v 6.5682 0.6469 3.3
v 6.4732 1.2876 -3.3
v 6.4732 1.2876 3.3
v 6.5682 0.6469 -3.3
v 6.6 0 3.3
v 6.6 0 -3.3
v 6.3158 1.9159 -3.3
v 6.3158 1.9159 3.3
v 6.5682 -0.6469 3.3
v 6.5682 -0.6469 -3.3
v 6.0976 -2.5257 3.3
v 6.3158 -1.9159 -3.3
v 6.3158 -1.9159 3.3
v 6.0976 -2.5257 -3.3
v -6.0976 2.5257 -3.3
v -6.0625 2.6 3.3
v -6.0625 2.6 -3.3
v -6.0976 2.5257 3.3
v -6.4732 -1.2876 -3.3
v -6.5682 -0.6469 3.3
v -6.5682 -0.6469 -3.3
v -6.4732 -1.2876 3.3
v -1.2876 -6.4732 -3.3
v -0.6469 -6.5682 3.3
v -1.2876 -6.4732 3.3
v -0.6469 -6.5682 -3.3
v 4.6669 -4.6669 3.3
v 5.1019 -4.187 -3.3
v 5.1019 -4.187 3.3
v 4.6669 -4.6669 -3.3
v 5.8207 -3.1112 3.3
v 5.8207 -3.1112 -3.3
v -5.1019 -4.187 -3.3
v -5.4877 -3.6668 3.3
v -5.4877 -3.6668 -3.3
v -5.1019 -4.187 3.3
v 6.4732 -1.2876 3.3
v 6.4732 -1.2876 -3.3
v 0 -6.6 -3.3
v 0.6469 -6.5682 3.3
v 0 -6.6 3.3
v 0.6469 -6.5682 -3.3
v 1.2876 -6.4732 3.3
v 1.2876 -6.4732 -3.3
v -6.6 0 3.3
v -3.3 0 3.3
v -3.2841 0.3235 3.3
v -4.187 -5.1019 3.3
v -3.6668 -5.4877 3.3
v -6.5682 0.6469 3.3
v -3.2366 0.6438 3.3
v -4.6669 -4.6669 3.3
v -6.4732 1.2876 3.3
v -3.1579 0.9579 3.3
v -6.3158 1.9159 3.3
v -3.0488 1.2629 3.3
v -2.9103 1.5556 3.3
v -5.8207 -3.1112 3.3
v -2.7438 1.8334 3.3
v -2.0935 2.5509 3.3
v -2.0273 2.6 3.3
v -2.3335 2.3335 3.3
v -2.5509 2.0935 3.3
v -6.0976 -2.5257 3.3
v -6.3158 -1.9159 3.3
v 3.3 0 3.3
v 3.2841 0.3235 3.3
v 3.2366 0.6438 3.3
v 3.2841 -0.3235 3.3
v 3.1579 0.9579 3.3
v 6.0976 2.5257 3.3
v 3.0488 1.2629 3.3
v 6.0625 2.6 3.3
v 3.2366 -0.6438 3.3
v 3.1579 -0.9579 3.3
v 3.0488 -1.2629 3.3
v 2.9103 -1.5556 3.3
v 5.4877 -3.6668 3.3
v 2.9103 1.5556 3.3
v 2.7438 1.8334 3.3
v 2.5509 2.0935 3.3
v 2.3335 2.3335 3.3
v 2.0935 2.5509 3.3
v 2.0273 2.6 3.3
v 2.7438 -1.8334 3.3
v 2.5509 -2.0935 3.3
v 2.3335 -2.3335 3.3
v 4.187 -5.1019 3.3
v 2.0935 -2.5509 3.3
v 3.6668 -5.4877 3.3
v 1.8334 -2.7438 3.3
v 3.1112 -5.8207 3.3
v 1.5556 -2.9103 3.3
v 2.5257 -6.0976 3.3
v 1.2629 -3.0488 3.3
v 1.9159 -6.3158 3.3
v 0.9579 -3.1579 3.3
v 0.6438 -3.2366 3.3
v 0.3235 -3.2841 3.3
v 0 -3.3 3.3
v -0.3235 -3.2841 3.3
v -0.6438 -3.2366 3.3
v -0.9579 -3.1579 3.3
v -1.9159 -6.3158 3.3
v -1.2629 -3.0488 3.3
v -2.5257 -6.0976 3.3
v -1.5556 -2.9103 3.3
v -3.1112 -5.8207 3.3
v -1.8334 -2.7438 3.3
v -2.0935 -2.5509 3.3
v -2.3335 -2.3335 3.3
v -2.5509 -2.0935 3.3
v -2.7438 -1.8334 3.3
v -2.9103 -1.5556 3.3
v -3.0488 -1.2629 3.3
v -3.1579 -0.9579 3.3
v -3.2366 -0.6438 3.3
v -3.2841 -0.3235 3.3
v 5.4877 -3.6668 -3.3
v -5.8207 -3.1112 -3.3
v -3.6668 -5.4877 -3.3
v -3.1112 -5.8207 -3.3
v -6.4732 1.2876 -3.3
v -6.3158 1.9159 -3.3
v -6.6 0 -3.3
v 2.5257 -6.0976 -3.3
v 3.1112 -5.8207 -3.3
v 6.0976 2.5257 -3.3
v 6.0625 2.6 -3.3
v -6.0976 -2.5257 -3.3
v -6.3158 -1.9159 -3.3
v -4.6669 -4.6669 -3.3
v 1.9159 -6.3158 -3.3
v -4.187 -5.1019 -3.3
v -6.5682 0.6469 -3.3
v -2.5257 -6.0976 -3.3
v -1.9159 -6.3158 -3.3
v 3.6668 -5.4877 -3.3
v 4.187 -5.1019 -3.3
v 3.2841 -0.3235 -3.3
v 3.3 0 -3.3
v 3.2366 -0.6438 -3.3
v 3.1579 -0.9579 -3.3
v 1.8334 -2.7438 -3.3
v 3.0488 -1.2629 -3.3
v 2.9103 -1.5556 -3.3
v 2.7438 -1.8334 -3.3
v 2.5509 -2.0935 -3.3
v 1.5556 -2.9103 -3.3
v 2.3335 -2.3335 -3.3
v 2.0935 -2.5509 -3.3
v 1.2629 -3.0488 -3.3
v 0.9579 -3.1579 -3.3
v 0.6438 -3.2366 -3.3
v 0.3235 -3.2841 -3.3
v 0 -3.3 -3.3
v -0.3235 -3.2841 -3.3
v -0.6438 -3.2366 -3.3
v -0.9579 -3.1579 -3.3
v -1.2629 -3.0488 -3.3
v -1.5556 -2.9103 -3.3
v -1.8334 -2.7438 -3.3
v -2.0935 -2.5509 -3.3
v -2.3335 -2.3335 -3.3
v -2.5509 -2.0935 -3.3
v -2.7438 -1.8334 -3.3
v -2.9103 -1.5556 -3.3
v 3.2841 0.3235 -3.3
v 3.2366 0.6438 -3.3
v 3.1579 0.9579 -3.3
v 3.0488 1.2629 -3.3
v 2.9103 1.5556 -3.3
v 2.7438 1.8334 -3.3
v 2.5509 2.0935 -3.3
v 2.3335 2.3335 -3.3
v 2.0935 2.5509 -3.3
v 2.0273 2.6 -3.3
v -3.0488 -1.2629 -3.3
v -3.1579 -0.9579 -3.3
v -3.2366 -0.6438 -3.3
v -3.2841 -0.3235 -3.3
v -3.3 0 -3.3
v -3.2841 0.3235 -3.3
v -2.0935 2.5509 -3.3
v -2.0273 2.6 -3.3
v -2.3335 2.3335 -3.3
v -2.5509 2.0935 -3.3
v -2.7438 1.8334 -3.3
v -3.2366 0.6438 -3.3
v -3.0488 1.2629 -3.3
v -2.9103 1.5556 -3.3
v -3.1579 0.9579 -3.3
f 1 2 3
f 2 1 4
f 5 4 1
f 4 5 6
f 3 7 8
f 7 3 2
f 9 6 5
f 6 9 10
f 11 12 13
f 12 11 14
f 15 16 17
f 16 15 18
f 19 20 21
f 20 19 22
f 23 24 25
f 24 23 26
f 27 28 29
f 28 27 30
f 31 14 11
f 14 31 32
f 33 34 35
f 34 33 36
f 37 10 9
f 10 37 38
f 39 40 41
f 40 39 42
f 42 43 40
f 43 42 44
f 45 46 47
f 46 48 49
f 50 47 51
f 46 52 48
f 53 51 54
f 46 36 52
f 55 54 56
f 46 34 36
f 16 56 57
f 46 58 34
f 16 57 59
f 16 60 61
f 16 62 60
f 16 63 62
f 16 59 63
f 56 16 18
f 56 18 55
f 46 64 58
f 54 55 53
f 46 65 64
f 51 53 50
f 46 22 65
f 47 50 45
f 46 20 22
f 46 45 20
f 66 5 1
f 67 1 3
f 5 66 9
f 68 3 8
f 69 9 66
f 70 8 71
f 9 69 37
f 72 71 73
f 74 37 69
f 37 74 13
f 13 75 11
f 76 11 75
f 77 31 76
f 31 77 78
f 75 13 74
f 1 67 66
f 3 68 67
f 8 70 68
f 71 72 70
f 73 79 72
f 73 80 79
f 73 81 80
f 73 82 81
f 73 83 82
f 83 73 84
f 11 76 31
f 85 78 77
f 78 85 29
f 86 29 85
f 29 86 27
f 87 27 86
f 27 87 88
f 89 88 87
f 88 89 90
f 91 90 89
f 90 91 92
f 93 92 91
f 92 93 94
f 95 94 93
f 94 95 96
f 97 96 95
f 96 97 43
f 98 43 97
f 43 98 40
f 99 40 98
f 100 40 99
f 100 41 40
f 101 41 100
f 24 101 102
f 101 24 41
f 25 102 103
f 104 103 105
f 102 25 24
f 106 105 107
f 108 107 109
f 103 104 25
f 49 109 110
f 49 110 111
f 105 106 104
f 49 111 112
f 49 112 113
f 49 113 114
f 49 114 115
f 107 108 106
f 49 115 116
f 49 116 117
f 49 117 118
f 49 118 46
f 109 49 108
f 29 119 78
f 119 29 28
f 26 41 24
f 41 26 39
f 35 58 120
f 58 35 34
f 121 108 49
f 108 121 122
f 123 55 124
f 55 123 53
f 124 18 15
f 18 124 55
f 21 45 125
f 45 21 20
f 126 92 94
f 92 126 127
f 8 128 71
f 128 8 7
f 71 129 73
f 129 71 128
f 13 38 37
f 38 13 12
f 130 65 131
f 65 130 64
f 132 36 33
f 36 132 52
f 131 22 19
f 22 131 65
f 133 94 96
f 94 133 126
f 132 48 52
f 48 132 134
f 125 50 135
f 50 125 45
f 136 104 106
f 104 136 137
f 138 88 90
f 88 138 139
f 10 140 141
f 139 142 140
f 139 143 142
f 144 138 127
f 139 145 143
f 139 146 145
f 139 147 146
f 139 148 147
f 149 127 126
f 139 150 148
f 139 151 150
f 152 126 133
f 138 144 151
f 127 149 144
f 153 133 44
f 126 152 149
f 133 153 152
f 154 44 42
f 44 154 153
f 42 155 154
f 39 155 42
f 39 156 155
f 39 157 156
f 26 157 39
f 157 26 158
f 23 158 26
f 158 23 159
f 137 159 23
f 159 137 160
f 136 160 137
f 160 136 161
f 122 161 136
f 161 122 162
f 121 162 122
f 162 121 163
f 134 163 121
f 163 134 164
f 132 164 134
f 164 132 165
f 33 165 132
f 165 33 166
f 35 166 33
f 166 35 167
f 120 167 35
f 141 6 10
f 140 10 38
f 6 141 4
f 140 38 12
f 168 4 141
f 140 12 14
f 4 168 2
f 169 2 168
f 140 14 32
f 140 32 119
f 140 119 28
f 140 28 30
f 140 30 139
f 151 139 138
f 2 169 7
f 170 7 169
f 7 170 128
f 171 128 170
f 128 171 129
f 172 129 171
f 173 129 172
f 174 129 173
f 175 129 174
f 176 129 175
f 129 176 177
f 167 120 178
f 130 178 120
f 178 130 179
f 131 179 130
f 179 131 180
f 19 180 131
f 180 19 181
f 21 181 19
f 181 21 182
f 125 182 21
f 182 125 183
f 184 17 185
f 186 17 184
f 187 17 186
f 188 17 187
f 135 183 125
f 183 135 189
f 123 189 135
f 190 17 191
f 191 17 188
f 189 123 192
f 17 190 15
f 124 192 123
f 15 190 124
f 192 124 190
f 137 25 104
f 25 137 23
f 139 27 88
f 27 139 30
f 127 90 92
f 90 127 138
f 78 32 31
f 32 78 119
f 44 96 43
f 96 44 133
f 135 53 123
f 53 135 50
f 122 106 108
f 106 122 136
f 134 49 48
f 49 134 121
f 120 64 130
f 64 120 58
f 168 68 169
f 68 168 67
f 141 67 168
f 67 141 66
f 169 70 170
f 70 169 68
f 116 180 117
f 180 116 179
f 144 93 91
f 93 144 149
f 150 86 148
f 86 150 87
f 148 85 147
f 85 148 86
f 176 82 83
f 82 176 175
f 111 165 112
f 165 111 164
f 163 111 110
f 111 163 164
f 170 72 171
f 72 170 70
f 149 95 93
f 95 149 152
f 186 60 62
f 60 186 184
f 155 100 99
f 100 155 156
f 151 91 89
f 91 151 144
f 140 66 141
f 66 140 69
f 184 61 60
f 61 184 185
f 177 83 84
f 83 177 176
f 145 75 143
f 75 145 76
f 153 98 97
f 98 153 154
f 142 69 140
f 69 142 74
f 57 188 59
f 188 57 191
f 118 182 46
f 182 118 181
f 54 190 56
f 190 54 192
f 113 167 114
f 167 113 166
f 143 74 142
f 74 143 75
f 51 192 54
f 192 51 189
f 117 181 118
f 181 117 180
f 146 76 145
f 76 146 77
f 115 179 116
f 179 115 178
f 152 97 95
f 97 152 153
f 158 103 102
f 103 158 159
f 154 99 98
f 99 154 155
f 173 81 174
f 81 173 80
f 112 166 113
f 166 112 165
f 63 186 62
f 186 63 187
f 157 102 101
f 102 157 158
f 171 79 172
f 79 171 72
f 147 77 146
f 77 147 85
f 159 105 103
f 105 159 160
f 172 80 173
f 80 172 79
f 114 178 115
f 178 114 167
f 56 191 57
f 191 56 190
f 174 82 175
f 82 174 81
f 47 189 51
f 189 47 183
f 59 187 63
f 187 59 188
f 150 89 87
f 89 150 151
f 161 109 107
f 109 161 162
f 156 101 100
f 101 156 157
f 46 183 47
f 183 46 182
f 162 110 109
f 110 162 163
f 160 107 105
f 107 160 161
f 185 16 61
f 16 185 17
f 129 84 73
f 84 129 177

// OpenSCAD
// COBRA Vertebra - T9 V15
// Height: 6.6000000000000005mm, OD: 13.200000000000001mm

$fn = 64;

difference() {
    // Outer cylinder
    cylinder(h=6.6000000000000005, d=13.200000000000001, center=true);
    
    // Inner channel
    cylinder(h=8.600000000000001, d=6.6000000000000005, center=true);

    // Solar panel cavity
    translate([0, 4.6000000000000005, 0])
    cube([50, 4, 30], center=true);

    // Pivot holes
    translate([0, 6.6000000000000005, 0.30000000000000027])
    rotate([90, 0, 0])
    cylinder(h=5.300000000000001, d=4, center=true);
    
    translate([0, 6.6000000000000005, -0.30000000000000027])
    rotate([90, 0, 0])
    cylinder(h=5.300000000000001, d=4, center=true);
}
